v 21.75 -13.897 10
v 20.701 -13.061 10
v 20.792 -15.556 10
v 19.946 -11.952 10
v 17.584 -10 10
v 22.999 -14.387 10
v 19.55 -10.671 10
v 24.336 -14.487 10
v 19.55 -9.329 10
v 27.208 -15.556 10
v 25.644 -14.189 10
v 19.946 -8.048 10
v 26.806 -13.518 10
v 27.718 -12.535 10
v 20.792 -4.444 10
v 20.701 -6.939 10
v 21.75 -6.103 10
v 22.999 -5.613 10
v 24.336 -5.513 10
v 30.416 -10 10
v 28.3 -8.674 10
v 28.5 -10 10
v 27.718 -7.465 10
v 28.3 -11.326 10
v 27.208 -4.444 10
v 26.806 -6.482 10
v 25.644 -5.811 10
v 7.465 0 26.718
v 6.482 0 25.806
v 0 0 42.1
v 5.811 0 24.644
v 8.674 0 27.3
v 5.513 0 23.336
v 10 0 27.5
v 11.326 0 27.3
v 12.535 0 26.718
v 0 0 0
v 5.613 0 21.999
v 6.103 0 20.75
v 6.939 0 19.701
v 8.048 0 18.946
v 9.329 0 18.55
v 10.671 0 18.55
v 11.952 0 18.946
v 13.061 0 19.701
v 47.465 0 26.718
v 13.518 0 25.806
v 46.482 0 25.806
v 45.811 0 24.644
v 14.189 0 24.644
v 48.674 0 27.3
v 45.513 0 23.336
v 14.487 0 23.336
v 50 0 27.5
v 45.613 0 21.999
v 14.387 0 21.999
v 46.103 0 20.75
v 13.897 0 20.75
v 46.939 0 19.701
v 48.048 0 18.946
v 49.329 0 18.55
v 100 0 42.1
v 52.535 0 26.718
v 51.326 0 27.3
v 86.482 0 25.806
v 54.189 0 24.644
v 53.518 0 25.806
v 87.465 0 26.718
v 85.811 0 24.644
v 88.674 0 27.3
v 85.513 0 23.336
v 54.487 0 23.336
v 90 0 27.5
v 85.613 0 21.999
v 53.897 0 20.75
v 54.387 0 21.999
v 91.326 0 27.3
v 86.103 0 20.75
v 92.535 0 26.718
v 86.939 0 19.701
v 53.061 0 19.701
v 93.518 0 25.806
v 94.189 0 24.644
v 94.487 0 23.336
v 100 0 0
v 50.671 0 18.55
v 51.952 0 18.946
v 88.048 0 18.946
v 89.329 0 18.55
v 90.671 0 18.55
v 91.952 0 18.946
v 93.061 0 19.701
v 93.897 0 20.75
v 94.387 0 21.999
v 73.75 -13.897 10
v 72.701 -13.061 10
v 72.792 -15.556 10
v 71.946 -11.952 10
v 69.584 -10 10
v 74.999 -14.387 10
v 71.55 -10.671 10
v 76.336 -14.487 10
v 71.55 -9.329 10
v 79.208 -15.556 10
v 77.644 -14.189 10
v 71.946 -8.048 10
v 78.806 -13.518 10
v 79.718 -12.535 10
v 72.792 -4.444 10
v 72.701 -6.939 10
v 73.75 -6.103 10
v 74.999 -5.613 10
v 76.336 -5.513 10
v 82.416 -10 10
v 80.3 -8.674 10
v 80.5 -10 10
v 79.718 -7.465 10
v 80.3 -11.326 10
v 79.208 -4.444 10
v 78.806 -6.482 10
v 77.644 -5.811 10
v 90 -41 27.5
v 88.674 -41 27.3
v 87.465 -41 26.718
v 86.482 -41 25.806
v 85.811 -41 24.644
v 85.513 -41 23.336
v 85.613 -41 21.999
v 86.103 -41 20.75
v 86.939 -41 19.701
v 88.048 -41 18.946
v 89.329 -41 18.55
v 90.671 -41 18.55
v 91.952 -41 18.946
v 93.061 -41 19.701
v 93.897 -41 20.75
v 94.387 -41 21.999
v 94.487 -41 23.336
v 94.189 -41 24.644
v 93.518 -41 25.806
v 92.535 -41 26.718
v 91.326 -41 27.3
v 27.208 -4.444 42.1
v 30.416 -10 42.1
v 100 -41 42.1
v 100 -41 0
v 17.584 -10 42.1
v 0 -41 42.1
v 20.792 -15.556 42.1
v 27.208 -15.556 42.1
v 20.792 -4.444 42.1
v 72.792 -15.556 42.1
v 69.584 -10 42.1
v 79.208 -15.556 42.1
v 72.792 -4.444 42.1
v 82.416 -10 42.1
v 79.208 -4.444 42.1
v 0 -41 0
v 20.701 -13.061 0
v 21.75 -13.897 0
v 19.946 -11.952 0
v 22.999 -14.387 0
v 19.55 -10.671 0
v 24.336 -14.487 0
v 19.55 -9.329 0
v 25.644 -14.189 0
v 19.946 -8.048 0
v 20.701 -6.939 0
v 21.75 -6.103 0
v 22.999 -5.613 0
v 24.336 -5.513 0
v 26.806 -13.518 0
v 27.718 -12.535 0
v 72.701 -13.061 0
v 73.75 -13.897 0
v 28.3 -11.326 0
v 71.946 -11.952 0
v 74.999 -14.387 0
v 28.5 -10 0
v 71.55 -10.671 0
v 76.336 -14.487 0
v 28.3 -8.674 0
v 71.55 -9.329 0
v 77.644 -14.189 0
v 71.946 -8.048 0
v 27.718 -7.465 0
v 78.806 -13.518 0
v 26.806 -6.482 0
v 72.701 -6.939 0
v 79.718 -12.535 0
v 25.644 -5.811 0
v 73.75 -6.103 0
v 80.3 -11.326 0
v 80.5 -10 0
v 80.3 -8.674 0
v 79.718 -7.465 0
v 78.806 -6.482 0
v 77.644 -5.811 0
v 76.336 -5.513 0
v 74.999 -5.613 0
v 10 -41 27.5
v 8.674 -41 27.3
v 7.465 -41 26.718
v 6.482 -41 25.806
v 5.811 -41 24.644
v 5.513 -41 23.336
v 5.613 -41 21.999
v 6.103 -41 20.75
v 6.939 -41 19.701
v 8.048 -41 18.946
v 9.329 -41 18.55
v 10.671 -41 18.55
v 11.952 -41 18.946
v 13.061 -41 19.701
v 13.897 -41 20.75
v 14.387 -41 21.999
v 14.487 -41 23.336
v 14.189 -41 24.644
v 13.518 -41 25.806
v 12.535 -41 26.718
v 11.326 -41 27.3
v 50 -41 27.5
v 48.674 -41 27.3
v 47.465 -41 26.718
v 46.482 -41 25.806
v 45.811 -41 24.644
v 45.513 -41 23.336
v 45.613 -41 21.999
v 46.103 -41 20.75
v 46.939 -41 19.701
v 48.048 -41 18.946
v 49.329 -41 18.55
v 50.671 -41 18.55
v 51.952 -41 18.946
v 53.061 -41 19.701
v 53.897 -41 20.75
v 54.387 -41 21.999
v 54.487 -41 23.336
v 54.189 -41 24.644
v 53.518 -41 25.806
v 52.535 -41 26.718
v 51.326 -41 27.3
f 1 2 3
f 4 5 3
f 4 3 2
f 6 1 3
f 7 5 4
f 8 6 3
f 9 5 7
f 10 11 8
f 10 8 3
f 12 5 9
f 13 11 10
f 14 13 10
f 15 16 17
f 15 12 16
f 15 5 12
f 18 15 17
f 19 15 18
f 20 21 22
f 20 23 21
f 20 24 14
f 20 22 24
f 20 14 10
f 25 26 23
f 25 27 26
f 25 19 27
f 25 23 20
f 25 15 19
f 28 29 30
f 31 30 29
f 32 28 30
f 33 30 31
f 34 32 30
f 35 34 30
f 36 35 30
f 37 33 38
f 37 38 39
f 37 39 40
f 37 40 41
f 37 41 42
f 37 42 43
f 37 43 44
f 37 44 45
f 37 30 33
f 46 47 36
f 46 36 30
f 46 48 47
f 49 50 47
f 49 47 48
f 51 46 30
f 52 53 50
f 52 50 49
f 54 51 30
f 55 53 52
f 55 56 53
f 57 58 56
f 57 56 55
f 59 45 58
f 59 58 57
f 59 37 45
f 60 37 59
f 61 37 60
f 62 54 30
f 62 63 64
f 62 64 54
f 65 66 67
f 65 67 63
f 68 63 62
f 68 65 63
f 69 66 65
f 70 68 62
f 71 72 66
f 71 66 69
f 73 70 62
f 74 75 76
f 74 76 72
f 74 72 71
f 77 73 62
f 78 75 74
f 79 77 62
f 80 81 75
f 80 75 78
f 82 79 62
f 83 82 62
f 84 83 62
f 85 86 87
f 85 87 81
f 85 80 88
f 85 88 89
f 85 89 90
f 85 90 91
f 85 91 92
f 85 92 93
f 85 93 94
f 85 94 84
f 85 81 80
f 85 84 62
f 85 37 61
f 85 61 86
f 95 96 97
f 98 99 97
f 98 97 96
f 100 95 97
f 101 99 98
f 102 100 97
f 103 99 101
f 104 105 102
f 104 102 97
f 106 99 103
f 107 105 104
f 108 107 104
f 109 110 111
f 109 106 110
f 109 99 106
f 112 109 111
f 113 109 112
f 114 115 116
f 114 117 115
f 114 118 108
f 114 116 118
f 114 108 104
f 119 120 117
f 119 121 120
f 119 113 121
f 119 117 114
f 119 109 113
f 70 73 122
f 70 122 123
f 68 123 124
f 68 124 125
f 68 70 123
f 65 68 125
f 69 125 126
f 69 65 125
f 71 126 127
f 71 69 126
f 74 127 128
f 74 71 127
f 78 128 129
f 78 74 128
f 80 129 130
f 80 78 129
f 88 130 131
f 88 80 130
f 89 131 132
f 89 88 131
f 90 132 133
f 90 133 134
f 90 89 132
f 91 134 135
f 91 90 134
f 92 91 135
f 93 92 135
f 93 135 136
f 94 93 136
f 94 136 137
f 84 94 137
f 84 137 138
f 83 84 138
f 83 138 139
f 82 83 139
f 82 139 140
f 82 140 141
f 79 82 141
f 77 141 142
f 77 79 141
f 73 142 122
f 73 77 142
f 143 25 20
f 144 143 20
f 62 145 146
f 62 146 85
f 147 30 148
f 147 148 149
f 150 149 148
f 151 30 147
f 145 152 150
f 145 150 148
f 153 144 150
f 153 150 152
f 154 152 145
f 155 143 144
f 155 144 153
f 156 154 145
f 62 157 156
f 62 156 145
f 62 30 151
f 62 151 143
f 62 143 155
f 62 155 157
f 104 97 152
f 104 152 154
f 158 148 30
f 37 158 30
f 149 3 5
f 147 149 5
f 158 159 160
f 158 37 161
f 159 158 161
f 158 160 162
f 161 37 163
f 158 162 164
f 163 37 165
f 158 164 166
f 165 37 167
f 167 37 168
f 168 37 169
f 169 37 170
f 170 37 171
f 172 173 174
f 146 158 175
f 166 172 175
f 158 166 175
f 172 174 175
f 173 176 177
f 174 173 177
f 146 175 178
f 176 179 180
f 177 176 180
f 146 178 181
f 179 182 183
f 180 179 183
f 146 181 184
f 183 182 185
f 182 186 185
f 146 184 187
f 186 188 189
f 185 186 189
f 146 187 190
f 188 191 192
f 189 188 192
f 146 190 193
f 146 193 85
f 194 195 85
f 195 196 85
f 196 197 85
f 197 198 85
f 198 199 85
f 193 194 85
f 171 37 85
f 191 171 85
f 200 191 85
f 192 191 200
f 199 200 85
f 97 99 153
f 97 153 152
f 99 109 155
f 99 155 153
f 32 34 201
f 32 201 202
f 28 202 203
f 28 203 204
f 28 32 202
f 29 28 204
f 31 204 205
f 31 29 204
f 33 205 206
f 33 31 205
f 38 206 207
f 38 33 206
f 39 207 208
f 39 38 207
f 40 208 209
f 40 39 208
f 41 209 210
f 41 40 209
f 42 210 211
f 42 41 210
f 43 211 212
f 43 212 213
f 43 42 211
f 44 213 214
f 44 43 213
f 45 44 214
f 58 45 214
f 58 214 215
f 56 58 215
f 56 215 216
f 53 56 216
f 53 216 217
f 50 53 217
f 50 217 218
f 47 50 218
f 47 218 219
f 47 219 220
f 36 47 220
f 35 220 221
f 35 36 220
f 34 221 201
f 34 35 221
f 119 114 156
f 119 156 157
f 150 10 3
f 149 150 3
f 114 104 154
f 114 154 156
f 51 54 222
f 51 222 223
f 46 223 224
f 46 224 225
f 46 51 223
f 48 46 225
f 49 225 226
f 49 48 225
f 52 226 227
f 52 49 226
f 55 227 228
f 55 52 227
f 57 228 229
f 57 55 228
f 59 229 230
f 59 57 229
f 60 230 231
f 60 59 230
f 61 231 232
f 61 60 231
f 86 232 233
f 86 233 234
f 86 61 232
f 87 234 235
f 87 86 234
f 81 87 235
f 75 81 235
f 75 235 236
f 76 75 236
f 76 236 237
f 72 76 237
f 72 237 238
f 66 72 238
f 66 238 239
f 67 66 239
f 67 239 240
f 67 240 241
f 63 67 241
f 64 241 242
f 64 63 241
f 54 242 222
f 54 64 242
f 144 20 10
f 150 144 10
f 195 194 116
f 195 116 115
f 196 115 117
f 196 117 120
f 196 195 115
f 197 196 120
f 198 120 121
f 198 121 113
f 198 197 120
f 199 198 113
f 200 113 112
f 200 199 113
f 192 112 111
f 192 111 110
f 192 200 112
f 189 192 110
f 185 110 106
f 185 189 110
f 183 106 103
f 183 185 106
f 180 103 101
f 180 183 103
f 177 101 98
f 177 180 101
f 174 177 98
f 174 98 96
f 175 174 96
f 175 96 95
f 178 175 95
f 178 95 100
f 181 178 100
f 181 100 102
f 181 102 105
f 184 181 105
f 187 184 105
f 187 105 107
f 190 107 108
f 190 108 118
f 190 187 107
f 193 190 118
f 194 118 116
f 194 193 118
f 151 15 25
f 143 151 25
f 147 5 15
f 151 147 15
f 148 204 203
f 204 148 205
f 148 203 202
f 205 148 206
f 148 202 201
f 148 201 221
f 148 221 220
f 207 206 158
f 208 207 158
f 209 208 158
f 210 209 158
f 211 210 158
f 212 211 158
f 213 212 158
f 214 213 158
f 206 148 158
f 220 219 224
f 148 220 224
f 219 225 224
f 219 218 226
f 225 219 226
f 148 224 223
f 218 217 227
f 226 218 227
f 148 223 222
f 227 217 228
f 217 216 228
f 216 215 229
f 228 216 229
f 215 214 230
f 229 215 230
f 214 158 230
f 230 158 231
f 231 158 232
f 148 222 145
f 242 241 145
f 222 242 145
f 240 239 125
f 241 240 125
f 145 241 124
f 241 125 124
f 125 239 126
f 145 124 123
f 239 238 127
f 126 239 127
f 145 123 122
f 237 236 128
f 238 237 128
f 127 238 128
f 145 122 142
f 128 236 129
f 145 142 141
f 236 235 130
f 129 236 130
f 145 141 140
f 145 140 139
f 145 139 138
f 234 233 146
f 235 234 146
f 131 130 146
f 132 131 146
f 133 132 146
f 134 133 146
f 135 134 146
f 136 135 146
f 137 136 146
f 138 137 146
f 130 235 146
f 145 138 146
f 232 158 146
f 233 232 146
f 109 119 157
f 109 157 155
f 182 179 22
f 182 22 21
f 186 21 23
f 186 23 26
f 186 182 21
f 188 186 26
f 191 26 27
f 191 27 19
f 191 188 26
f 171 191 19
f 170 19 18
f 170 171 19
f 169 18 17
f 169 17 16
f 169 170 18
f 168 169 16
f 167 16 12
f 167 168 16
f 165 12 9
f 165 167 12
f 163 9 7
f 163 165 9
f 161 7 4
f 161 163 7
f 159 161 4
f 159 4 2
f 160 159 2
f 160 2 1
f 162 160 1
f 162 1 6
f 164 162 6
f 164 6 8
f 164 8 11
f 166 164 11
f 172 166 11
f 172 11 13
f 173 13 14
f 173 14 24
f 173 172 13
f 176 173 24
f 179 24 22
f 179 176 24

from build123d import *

# Parameters (mm, degrees)
SKETCH1_W           = 100
SKETCH1_H           = 41
BOSS_EXTRUDE1_DEPTH = 42.1
SKETCH2_R           = 4.5
CUT_EXTRUDE1_DEPTH  = 41
SKETCH1_3_R         = 4.5
BOSS_EXTRUDE2_DEPTH = 10


with BuildPart() as part:
    # Sketch1 → Boss-Extrude1 (new body)
    with BuildSketch(Plane.XY):
        with Locations((50, -20.5)):
            Rectangle(SKETCH1_W, SKETCH1_H)
        Polygon((79.207902433, -4.44375), (72.792097567, -4.44375), (69.584195134, -10), (72.792097567, -15.55625), (79.207902433, -15.55625), (82.415804866, -10), align=None, mode=Mode.SUBTRACT)
        Polygon((20.792097567, -15.55625), (17.584195134, -10), (20.792097567, -4.44375), (27.207902433, -4.44375), (30.415804866, -10), (27.207902433, -15.55625), align=None, mode=Mode.SUBTRACT)
    extrude(amount=BOSS_EXTRUDE1_DEPTH)

    # Sketch2 → Cut-Extrude1 (cut)
    with BuildSketch(Plane(origin=(0, 0, 0), x_dir=(-1, 0, 0), z_dir=(0, -1, 0))):
        with Locations(Location((-10, -23, 0), (0, 0, 270))):
            Circle(SKETCH2_R)
        with Locations(Location((-50, -23, 0), (0, 0, 270))):
            Circle(SKETCH2_R)
        with Locations(Location((-90, -23, 0), (0, 0, 270))):
            Circle(SKETCH2_R)
    extrude(amount=CUT_EXTRUDE1_DEPTH, mode=Mode.SUBTRACT)

    # Sketch1<3> → Boss-Extrude2 (add)
    # profile 1 of 2: a face of its own
    with BuildSketch(Plane.XY):
        Polygon((27.207902433, -4.44375), (20.792097567, -4.44375), (17.584195134, -10), (20.792097567, -15.55625), (27.207902433, -15.55625), (30.415804866, -10), align=None)
        with Locations((24, -10)):
            Circle(SKETCH1_3_R, mode=Mode.SUBTRACT)
    # profile 2 of 2: a face of its own
    with BuildSketch(Plane.XY):
        Polygon((79.207902433, -15.55625), (82.415804866, -10), (79.207902433, -4.44375), (72.792097567, -4.44375), (69.584195134, -10), (72.792097567, -15.55625), align=None)
        with Locations((76, -10)):
            Circle(SKETCH1_3_R, mode=Mode.SUBTRACT)
    extrude(amount=BOSS_EXTRUDE2_DEPTH)


solid = part.part
